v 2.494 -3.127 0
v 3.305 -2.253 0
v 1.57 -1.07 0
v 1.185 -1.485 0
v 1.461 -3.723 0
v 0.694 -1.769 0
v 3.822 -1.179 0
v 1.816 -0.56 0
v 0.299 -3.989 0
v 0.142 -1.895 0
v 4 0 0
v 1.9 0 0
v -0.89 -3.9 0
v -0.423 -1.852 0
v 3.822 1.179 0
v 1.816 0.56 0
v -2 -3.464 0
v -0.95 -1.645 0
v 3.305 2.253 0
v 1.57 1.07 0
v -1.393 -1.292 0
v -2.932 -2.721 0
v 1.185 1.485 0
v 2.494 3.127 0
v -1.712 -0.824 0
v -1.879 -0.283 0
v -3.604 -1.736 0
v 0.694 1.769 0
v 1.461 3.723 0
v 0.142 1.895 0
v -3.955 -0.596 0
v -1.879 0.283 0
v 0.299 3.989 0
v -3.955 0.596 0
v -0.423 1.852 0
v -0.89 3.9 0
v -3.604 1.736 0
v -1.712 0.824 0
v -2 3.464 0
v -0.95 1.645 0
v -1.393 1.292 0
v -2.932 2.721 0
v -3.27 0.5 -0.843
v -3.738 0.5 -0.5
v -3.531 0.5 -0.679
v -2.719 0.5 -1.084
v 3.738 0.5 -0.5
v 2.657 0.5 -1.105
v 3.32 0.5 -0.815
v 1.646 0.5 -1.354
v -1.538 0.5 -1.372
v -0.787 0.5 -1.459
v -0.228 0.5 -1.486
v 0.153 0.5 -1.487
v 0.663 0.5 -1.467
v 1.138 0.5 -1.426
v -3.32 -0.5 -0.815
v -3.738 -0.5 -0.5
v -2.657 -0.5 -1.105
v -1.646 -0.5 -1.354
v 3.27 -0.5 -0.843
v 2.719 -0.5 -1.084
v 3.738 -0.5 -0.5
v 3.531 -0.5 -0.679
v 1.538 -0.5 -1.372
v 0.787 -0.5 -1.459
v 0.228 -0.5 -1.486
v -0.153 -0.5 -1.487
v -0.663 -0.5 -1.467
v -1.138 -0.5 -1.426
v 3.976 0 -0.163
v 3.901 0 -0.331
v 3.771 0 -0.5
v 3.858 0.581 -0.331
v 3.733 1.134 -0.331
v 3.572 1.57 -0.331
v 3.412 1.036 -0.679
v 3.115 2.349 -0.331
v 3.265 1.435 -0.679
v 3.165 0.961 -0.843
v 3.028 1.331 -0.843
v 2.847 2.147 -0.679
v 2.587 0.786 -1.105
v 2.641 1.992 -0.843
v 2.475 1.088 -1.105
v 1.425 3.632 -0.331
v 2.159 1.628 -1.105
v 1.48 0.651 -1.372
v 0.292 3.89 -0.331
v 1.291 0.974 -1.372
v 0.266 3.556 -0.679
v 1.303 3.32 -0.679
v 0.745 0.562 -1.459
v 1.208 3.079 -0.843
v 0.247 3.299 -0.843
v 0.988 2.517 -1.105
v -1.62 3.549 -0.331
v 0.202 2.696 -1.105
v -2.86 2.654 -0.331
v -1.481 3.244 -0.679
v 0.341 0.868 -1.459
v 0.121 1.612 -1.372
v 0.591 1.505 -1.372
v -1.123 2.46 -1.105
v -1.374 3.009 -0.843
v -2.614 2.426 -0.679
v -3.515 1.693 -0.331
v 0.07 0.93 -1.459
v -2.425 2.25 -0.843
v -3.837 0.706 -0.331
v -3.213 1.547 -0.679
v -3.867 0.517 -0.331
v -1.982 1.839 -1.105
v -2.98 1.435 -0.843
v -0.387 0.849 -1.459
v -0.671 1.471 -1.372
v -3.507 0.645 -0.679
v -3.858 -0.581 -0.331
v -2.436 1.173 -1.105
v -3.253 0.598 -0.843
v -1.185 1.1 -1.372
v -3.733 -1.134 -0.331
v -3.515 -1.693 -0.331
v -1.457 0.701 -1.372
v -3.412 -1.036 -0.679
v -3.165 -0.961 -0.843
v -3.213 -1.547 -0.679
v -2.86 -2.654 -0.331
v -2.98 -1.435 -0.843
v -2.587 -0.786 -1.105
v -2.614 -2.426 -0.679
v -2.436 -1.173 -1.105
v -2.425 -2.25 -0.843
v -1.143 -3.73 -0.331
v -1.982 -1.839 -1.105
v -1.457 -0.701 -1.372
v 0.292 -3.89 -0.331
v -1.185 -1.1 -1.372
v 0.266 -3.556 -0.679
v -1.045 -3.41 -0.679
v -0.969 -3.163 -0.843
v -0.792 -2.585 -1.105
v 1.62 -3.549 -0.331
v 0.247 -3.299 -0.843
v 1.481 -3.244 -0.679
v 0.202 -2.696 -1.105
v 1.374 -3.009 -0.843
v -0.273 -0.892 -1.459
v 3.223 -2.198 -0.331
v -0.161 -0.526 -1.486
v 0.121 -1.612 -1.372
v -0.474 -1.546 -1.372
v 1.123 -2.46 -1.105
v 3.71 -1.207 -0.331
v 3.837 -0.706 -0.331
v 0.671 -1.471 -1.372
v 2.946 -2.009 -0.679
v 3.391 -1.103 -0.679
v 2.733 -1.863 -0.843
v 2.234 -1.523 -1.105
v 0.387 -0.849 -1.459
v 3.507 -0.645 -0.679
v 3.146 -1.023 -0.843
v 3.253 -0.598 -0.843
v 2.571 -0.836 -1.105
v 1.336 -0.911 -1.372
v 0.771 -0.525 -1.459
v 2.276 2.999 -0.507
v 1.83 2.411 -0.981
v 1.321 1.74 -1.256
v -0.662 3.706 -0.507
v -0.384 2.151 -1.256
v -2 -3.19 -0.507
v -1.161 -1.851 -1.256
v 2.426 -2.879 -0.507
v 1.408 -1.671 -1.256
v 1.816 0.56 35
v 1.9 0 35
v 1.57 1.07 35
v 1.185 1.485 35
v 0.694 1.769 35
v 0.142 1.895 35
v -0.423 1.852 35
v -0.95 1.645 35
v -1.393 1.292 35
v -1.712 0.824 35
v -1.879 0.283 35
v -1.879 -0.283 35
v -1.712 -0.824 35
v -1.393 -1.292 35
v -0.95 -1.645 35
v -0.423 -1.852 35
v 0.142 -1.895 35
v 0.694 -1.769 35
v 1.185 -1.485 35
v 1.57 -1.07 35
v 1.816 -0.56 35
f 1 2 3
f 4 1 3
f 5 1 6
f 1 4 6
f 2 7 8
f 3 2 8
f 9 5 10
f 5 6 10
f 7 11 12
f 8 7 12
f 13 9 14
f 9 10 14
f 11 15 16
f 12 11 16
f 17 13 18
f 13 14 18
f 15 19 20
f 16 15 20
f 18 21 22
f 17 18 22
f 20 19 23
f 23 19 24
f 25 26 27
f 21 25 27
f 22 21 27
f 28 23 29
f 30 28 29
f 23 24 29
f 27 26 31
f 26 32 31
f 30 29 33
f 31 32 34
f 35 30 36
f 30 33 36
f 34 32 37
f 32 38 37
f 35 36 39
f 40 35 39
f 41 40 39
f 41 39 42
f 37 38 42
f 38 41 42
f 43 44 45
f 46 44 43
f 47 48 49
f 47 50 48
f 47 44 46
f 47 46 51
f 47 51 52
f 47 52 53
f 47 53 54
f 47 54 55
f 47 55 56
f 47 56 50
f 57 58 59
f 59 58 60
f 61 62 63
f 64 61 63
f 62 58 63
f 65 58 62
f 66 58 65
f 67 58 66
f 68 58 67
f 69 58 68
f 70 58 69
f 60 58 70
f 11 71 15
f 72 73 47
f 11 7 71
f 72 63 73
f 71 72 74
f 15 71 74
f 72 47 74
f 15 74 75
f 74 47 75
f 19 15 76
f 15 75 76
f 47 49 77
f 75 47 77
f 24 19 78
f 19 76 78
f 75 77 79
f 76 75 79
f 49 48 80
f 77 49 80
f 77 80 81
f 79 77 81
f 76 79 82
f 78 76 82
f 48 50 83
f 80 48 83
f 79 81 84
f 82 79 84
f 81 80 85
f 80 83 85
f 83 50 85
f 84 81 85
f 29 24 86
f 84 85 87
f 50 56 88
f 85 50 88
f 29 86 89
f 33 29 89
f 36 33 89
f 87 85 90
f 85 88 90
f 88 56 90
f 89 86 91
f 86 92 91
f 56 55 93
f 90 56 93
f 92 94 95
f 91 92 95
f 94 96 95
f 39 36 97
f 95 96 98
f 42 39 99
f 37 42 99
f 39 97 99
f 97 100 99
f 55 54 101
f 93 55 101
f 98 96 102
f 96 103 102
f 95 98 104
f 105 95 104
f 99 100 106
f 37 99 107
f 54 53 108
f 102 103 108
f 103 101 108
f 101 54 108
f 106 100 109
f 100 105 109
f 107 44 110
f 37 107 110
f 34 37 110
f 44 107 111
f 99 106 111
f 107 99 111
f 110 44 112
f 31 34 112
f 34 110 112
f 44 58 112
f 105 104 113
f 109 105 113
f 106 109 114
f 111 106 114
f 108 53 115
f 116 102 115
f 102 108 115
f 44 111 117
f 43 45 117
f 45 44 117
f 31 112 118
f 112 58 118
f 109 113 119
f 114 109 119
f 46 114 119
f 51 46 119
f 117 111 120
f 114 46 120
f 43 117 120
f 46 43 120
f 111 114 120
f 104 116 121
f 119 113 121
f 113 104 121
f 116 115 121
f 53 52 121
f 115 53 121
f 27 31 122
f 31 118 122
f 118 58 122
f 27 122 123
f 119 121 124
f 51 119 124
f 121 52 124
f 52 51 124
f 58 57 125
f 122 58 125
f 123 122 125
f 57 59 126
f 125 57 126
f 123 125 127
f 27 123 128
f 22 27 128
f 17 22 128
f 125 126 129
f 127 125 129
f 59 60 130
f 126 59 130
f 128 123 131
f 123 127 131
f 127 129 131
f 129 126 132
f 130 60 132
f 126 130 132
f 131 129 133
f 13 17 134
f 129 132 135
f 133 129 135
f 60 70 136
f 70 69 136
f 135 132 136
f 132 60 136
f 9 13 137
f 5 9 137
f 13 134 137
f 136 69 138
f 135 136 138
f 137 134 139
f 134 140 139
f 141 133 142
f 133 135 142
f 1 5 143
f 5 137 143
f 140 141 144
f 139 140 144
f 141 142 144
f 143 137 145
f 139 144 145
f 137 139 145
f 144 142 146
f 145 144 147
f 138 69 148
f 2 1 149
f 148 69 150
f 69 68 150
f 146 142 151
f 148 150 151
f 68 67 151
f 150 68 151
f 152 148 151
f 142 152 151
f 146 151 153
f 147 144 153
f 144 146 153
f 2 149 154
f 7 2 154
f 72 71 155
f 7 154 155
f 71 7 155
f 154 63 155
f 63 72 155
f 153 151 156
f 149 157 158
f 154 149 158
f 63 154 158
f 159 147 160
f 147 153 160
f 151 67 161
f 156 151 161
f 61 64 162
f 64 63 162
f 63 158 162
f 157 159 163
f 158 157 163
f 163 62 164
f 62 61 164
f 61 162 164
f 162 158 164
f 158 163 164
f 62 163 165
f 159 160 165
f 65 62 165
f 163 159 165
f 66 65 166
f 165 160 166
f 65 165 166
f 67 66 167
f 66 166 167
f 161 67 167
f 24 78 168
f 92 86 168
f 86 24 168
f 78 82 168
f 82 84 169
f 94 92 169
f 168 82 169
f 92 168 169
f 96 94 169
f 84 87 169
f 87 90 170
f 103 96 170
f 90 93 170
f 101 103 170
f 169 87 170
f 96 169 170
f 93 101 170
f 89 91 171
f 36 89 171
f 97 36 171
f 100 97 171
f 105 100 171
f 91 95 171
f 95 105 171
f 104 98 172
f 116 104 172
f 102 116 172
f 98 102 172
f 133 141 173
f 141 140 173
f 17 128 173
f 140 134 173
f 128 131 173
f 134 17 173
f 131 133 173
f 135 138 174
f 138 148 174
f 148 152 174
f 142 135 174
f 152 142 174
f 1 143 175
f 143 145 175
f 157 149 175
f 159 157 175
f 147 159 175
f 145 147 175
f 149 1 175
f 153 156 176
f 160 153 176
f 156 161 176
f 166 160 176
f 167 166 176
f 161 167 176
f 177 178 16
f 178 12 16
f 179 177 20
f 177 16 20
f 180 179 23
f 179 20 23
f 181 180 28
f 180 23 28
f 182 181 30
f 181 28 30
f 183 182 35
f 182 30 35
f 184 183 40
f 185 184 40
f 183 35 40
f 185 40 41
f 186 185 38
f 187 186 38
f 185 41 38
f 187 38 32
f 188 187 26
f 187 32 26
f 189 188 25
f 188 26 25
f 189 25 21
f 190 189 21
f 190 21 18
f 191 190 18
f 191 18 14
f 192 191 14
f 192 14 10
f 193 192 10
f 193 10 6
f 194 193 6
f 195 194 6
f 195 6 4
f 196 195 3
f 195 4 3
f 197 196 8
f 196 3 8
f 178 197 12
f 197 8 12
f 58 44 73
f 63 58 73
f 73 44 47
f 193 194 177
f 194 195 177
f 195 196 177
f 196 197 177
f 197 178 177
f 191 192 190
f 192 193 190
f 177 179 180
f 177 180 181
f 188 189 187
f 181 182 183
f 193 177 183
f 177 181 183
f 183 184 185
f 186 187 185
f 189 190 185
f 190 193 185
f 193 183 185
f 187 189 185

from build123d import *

# Parameters (mm, degrees)
CORTE_EXTRUS_O1_START = -0.5
ESBO_O2_W             = 9.2
ESBO_O2_H             = 1
CORTE_EXTRUS_O1_DEPTH = 10


with BuildPart() as part:
    # Esboço1 → Revolução1 (revolve)
    with BuildSketch(Plane(origin=(0, 0, 0), x_dir=(1, 0, 0), z_dir=(0, 1, 0))):
        with BuildLine():
            Line((1.9, 0), (4, 0))
            add(Edge.make_bspline(
                [(4, 0), (4, 1.5), (0, 1.5)],
                knots=[0, 0, 0, 1.570796327, 1.570796327, 1.570796327], degree=2, weights=[1, 0.707106781, 1]))
            Line((0, 1.5), (0, 0))
            Line((0, 0), (0, -35))
            Line((0, -35), (1.9, -35))
            Line((1.9, -35), (1.9, 0))
        make_face()
    revolve(axis=Axis((0, 0, 0), (0, 0, 1)))

    # Esboço2 → Corte-extrusão1 (cut)
    with BuildSketch(Plane.XY.offset(CORTE_EXTRUS_O1_START)):
        Rectangle(ESBO_O2_W, ESBO_O2_H)
    extrude(amount=-CORTE_EXTRUS_O1_DEPTH, mode=Mode.SUBTRACT)


solid = part.part
